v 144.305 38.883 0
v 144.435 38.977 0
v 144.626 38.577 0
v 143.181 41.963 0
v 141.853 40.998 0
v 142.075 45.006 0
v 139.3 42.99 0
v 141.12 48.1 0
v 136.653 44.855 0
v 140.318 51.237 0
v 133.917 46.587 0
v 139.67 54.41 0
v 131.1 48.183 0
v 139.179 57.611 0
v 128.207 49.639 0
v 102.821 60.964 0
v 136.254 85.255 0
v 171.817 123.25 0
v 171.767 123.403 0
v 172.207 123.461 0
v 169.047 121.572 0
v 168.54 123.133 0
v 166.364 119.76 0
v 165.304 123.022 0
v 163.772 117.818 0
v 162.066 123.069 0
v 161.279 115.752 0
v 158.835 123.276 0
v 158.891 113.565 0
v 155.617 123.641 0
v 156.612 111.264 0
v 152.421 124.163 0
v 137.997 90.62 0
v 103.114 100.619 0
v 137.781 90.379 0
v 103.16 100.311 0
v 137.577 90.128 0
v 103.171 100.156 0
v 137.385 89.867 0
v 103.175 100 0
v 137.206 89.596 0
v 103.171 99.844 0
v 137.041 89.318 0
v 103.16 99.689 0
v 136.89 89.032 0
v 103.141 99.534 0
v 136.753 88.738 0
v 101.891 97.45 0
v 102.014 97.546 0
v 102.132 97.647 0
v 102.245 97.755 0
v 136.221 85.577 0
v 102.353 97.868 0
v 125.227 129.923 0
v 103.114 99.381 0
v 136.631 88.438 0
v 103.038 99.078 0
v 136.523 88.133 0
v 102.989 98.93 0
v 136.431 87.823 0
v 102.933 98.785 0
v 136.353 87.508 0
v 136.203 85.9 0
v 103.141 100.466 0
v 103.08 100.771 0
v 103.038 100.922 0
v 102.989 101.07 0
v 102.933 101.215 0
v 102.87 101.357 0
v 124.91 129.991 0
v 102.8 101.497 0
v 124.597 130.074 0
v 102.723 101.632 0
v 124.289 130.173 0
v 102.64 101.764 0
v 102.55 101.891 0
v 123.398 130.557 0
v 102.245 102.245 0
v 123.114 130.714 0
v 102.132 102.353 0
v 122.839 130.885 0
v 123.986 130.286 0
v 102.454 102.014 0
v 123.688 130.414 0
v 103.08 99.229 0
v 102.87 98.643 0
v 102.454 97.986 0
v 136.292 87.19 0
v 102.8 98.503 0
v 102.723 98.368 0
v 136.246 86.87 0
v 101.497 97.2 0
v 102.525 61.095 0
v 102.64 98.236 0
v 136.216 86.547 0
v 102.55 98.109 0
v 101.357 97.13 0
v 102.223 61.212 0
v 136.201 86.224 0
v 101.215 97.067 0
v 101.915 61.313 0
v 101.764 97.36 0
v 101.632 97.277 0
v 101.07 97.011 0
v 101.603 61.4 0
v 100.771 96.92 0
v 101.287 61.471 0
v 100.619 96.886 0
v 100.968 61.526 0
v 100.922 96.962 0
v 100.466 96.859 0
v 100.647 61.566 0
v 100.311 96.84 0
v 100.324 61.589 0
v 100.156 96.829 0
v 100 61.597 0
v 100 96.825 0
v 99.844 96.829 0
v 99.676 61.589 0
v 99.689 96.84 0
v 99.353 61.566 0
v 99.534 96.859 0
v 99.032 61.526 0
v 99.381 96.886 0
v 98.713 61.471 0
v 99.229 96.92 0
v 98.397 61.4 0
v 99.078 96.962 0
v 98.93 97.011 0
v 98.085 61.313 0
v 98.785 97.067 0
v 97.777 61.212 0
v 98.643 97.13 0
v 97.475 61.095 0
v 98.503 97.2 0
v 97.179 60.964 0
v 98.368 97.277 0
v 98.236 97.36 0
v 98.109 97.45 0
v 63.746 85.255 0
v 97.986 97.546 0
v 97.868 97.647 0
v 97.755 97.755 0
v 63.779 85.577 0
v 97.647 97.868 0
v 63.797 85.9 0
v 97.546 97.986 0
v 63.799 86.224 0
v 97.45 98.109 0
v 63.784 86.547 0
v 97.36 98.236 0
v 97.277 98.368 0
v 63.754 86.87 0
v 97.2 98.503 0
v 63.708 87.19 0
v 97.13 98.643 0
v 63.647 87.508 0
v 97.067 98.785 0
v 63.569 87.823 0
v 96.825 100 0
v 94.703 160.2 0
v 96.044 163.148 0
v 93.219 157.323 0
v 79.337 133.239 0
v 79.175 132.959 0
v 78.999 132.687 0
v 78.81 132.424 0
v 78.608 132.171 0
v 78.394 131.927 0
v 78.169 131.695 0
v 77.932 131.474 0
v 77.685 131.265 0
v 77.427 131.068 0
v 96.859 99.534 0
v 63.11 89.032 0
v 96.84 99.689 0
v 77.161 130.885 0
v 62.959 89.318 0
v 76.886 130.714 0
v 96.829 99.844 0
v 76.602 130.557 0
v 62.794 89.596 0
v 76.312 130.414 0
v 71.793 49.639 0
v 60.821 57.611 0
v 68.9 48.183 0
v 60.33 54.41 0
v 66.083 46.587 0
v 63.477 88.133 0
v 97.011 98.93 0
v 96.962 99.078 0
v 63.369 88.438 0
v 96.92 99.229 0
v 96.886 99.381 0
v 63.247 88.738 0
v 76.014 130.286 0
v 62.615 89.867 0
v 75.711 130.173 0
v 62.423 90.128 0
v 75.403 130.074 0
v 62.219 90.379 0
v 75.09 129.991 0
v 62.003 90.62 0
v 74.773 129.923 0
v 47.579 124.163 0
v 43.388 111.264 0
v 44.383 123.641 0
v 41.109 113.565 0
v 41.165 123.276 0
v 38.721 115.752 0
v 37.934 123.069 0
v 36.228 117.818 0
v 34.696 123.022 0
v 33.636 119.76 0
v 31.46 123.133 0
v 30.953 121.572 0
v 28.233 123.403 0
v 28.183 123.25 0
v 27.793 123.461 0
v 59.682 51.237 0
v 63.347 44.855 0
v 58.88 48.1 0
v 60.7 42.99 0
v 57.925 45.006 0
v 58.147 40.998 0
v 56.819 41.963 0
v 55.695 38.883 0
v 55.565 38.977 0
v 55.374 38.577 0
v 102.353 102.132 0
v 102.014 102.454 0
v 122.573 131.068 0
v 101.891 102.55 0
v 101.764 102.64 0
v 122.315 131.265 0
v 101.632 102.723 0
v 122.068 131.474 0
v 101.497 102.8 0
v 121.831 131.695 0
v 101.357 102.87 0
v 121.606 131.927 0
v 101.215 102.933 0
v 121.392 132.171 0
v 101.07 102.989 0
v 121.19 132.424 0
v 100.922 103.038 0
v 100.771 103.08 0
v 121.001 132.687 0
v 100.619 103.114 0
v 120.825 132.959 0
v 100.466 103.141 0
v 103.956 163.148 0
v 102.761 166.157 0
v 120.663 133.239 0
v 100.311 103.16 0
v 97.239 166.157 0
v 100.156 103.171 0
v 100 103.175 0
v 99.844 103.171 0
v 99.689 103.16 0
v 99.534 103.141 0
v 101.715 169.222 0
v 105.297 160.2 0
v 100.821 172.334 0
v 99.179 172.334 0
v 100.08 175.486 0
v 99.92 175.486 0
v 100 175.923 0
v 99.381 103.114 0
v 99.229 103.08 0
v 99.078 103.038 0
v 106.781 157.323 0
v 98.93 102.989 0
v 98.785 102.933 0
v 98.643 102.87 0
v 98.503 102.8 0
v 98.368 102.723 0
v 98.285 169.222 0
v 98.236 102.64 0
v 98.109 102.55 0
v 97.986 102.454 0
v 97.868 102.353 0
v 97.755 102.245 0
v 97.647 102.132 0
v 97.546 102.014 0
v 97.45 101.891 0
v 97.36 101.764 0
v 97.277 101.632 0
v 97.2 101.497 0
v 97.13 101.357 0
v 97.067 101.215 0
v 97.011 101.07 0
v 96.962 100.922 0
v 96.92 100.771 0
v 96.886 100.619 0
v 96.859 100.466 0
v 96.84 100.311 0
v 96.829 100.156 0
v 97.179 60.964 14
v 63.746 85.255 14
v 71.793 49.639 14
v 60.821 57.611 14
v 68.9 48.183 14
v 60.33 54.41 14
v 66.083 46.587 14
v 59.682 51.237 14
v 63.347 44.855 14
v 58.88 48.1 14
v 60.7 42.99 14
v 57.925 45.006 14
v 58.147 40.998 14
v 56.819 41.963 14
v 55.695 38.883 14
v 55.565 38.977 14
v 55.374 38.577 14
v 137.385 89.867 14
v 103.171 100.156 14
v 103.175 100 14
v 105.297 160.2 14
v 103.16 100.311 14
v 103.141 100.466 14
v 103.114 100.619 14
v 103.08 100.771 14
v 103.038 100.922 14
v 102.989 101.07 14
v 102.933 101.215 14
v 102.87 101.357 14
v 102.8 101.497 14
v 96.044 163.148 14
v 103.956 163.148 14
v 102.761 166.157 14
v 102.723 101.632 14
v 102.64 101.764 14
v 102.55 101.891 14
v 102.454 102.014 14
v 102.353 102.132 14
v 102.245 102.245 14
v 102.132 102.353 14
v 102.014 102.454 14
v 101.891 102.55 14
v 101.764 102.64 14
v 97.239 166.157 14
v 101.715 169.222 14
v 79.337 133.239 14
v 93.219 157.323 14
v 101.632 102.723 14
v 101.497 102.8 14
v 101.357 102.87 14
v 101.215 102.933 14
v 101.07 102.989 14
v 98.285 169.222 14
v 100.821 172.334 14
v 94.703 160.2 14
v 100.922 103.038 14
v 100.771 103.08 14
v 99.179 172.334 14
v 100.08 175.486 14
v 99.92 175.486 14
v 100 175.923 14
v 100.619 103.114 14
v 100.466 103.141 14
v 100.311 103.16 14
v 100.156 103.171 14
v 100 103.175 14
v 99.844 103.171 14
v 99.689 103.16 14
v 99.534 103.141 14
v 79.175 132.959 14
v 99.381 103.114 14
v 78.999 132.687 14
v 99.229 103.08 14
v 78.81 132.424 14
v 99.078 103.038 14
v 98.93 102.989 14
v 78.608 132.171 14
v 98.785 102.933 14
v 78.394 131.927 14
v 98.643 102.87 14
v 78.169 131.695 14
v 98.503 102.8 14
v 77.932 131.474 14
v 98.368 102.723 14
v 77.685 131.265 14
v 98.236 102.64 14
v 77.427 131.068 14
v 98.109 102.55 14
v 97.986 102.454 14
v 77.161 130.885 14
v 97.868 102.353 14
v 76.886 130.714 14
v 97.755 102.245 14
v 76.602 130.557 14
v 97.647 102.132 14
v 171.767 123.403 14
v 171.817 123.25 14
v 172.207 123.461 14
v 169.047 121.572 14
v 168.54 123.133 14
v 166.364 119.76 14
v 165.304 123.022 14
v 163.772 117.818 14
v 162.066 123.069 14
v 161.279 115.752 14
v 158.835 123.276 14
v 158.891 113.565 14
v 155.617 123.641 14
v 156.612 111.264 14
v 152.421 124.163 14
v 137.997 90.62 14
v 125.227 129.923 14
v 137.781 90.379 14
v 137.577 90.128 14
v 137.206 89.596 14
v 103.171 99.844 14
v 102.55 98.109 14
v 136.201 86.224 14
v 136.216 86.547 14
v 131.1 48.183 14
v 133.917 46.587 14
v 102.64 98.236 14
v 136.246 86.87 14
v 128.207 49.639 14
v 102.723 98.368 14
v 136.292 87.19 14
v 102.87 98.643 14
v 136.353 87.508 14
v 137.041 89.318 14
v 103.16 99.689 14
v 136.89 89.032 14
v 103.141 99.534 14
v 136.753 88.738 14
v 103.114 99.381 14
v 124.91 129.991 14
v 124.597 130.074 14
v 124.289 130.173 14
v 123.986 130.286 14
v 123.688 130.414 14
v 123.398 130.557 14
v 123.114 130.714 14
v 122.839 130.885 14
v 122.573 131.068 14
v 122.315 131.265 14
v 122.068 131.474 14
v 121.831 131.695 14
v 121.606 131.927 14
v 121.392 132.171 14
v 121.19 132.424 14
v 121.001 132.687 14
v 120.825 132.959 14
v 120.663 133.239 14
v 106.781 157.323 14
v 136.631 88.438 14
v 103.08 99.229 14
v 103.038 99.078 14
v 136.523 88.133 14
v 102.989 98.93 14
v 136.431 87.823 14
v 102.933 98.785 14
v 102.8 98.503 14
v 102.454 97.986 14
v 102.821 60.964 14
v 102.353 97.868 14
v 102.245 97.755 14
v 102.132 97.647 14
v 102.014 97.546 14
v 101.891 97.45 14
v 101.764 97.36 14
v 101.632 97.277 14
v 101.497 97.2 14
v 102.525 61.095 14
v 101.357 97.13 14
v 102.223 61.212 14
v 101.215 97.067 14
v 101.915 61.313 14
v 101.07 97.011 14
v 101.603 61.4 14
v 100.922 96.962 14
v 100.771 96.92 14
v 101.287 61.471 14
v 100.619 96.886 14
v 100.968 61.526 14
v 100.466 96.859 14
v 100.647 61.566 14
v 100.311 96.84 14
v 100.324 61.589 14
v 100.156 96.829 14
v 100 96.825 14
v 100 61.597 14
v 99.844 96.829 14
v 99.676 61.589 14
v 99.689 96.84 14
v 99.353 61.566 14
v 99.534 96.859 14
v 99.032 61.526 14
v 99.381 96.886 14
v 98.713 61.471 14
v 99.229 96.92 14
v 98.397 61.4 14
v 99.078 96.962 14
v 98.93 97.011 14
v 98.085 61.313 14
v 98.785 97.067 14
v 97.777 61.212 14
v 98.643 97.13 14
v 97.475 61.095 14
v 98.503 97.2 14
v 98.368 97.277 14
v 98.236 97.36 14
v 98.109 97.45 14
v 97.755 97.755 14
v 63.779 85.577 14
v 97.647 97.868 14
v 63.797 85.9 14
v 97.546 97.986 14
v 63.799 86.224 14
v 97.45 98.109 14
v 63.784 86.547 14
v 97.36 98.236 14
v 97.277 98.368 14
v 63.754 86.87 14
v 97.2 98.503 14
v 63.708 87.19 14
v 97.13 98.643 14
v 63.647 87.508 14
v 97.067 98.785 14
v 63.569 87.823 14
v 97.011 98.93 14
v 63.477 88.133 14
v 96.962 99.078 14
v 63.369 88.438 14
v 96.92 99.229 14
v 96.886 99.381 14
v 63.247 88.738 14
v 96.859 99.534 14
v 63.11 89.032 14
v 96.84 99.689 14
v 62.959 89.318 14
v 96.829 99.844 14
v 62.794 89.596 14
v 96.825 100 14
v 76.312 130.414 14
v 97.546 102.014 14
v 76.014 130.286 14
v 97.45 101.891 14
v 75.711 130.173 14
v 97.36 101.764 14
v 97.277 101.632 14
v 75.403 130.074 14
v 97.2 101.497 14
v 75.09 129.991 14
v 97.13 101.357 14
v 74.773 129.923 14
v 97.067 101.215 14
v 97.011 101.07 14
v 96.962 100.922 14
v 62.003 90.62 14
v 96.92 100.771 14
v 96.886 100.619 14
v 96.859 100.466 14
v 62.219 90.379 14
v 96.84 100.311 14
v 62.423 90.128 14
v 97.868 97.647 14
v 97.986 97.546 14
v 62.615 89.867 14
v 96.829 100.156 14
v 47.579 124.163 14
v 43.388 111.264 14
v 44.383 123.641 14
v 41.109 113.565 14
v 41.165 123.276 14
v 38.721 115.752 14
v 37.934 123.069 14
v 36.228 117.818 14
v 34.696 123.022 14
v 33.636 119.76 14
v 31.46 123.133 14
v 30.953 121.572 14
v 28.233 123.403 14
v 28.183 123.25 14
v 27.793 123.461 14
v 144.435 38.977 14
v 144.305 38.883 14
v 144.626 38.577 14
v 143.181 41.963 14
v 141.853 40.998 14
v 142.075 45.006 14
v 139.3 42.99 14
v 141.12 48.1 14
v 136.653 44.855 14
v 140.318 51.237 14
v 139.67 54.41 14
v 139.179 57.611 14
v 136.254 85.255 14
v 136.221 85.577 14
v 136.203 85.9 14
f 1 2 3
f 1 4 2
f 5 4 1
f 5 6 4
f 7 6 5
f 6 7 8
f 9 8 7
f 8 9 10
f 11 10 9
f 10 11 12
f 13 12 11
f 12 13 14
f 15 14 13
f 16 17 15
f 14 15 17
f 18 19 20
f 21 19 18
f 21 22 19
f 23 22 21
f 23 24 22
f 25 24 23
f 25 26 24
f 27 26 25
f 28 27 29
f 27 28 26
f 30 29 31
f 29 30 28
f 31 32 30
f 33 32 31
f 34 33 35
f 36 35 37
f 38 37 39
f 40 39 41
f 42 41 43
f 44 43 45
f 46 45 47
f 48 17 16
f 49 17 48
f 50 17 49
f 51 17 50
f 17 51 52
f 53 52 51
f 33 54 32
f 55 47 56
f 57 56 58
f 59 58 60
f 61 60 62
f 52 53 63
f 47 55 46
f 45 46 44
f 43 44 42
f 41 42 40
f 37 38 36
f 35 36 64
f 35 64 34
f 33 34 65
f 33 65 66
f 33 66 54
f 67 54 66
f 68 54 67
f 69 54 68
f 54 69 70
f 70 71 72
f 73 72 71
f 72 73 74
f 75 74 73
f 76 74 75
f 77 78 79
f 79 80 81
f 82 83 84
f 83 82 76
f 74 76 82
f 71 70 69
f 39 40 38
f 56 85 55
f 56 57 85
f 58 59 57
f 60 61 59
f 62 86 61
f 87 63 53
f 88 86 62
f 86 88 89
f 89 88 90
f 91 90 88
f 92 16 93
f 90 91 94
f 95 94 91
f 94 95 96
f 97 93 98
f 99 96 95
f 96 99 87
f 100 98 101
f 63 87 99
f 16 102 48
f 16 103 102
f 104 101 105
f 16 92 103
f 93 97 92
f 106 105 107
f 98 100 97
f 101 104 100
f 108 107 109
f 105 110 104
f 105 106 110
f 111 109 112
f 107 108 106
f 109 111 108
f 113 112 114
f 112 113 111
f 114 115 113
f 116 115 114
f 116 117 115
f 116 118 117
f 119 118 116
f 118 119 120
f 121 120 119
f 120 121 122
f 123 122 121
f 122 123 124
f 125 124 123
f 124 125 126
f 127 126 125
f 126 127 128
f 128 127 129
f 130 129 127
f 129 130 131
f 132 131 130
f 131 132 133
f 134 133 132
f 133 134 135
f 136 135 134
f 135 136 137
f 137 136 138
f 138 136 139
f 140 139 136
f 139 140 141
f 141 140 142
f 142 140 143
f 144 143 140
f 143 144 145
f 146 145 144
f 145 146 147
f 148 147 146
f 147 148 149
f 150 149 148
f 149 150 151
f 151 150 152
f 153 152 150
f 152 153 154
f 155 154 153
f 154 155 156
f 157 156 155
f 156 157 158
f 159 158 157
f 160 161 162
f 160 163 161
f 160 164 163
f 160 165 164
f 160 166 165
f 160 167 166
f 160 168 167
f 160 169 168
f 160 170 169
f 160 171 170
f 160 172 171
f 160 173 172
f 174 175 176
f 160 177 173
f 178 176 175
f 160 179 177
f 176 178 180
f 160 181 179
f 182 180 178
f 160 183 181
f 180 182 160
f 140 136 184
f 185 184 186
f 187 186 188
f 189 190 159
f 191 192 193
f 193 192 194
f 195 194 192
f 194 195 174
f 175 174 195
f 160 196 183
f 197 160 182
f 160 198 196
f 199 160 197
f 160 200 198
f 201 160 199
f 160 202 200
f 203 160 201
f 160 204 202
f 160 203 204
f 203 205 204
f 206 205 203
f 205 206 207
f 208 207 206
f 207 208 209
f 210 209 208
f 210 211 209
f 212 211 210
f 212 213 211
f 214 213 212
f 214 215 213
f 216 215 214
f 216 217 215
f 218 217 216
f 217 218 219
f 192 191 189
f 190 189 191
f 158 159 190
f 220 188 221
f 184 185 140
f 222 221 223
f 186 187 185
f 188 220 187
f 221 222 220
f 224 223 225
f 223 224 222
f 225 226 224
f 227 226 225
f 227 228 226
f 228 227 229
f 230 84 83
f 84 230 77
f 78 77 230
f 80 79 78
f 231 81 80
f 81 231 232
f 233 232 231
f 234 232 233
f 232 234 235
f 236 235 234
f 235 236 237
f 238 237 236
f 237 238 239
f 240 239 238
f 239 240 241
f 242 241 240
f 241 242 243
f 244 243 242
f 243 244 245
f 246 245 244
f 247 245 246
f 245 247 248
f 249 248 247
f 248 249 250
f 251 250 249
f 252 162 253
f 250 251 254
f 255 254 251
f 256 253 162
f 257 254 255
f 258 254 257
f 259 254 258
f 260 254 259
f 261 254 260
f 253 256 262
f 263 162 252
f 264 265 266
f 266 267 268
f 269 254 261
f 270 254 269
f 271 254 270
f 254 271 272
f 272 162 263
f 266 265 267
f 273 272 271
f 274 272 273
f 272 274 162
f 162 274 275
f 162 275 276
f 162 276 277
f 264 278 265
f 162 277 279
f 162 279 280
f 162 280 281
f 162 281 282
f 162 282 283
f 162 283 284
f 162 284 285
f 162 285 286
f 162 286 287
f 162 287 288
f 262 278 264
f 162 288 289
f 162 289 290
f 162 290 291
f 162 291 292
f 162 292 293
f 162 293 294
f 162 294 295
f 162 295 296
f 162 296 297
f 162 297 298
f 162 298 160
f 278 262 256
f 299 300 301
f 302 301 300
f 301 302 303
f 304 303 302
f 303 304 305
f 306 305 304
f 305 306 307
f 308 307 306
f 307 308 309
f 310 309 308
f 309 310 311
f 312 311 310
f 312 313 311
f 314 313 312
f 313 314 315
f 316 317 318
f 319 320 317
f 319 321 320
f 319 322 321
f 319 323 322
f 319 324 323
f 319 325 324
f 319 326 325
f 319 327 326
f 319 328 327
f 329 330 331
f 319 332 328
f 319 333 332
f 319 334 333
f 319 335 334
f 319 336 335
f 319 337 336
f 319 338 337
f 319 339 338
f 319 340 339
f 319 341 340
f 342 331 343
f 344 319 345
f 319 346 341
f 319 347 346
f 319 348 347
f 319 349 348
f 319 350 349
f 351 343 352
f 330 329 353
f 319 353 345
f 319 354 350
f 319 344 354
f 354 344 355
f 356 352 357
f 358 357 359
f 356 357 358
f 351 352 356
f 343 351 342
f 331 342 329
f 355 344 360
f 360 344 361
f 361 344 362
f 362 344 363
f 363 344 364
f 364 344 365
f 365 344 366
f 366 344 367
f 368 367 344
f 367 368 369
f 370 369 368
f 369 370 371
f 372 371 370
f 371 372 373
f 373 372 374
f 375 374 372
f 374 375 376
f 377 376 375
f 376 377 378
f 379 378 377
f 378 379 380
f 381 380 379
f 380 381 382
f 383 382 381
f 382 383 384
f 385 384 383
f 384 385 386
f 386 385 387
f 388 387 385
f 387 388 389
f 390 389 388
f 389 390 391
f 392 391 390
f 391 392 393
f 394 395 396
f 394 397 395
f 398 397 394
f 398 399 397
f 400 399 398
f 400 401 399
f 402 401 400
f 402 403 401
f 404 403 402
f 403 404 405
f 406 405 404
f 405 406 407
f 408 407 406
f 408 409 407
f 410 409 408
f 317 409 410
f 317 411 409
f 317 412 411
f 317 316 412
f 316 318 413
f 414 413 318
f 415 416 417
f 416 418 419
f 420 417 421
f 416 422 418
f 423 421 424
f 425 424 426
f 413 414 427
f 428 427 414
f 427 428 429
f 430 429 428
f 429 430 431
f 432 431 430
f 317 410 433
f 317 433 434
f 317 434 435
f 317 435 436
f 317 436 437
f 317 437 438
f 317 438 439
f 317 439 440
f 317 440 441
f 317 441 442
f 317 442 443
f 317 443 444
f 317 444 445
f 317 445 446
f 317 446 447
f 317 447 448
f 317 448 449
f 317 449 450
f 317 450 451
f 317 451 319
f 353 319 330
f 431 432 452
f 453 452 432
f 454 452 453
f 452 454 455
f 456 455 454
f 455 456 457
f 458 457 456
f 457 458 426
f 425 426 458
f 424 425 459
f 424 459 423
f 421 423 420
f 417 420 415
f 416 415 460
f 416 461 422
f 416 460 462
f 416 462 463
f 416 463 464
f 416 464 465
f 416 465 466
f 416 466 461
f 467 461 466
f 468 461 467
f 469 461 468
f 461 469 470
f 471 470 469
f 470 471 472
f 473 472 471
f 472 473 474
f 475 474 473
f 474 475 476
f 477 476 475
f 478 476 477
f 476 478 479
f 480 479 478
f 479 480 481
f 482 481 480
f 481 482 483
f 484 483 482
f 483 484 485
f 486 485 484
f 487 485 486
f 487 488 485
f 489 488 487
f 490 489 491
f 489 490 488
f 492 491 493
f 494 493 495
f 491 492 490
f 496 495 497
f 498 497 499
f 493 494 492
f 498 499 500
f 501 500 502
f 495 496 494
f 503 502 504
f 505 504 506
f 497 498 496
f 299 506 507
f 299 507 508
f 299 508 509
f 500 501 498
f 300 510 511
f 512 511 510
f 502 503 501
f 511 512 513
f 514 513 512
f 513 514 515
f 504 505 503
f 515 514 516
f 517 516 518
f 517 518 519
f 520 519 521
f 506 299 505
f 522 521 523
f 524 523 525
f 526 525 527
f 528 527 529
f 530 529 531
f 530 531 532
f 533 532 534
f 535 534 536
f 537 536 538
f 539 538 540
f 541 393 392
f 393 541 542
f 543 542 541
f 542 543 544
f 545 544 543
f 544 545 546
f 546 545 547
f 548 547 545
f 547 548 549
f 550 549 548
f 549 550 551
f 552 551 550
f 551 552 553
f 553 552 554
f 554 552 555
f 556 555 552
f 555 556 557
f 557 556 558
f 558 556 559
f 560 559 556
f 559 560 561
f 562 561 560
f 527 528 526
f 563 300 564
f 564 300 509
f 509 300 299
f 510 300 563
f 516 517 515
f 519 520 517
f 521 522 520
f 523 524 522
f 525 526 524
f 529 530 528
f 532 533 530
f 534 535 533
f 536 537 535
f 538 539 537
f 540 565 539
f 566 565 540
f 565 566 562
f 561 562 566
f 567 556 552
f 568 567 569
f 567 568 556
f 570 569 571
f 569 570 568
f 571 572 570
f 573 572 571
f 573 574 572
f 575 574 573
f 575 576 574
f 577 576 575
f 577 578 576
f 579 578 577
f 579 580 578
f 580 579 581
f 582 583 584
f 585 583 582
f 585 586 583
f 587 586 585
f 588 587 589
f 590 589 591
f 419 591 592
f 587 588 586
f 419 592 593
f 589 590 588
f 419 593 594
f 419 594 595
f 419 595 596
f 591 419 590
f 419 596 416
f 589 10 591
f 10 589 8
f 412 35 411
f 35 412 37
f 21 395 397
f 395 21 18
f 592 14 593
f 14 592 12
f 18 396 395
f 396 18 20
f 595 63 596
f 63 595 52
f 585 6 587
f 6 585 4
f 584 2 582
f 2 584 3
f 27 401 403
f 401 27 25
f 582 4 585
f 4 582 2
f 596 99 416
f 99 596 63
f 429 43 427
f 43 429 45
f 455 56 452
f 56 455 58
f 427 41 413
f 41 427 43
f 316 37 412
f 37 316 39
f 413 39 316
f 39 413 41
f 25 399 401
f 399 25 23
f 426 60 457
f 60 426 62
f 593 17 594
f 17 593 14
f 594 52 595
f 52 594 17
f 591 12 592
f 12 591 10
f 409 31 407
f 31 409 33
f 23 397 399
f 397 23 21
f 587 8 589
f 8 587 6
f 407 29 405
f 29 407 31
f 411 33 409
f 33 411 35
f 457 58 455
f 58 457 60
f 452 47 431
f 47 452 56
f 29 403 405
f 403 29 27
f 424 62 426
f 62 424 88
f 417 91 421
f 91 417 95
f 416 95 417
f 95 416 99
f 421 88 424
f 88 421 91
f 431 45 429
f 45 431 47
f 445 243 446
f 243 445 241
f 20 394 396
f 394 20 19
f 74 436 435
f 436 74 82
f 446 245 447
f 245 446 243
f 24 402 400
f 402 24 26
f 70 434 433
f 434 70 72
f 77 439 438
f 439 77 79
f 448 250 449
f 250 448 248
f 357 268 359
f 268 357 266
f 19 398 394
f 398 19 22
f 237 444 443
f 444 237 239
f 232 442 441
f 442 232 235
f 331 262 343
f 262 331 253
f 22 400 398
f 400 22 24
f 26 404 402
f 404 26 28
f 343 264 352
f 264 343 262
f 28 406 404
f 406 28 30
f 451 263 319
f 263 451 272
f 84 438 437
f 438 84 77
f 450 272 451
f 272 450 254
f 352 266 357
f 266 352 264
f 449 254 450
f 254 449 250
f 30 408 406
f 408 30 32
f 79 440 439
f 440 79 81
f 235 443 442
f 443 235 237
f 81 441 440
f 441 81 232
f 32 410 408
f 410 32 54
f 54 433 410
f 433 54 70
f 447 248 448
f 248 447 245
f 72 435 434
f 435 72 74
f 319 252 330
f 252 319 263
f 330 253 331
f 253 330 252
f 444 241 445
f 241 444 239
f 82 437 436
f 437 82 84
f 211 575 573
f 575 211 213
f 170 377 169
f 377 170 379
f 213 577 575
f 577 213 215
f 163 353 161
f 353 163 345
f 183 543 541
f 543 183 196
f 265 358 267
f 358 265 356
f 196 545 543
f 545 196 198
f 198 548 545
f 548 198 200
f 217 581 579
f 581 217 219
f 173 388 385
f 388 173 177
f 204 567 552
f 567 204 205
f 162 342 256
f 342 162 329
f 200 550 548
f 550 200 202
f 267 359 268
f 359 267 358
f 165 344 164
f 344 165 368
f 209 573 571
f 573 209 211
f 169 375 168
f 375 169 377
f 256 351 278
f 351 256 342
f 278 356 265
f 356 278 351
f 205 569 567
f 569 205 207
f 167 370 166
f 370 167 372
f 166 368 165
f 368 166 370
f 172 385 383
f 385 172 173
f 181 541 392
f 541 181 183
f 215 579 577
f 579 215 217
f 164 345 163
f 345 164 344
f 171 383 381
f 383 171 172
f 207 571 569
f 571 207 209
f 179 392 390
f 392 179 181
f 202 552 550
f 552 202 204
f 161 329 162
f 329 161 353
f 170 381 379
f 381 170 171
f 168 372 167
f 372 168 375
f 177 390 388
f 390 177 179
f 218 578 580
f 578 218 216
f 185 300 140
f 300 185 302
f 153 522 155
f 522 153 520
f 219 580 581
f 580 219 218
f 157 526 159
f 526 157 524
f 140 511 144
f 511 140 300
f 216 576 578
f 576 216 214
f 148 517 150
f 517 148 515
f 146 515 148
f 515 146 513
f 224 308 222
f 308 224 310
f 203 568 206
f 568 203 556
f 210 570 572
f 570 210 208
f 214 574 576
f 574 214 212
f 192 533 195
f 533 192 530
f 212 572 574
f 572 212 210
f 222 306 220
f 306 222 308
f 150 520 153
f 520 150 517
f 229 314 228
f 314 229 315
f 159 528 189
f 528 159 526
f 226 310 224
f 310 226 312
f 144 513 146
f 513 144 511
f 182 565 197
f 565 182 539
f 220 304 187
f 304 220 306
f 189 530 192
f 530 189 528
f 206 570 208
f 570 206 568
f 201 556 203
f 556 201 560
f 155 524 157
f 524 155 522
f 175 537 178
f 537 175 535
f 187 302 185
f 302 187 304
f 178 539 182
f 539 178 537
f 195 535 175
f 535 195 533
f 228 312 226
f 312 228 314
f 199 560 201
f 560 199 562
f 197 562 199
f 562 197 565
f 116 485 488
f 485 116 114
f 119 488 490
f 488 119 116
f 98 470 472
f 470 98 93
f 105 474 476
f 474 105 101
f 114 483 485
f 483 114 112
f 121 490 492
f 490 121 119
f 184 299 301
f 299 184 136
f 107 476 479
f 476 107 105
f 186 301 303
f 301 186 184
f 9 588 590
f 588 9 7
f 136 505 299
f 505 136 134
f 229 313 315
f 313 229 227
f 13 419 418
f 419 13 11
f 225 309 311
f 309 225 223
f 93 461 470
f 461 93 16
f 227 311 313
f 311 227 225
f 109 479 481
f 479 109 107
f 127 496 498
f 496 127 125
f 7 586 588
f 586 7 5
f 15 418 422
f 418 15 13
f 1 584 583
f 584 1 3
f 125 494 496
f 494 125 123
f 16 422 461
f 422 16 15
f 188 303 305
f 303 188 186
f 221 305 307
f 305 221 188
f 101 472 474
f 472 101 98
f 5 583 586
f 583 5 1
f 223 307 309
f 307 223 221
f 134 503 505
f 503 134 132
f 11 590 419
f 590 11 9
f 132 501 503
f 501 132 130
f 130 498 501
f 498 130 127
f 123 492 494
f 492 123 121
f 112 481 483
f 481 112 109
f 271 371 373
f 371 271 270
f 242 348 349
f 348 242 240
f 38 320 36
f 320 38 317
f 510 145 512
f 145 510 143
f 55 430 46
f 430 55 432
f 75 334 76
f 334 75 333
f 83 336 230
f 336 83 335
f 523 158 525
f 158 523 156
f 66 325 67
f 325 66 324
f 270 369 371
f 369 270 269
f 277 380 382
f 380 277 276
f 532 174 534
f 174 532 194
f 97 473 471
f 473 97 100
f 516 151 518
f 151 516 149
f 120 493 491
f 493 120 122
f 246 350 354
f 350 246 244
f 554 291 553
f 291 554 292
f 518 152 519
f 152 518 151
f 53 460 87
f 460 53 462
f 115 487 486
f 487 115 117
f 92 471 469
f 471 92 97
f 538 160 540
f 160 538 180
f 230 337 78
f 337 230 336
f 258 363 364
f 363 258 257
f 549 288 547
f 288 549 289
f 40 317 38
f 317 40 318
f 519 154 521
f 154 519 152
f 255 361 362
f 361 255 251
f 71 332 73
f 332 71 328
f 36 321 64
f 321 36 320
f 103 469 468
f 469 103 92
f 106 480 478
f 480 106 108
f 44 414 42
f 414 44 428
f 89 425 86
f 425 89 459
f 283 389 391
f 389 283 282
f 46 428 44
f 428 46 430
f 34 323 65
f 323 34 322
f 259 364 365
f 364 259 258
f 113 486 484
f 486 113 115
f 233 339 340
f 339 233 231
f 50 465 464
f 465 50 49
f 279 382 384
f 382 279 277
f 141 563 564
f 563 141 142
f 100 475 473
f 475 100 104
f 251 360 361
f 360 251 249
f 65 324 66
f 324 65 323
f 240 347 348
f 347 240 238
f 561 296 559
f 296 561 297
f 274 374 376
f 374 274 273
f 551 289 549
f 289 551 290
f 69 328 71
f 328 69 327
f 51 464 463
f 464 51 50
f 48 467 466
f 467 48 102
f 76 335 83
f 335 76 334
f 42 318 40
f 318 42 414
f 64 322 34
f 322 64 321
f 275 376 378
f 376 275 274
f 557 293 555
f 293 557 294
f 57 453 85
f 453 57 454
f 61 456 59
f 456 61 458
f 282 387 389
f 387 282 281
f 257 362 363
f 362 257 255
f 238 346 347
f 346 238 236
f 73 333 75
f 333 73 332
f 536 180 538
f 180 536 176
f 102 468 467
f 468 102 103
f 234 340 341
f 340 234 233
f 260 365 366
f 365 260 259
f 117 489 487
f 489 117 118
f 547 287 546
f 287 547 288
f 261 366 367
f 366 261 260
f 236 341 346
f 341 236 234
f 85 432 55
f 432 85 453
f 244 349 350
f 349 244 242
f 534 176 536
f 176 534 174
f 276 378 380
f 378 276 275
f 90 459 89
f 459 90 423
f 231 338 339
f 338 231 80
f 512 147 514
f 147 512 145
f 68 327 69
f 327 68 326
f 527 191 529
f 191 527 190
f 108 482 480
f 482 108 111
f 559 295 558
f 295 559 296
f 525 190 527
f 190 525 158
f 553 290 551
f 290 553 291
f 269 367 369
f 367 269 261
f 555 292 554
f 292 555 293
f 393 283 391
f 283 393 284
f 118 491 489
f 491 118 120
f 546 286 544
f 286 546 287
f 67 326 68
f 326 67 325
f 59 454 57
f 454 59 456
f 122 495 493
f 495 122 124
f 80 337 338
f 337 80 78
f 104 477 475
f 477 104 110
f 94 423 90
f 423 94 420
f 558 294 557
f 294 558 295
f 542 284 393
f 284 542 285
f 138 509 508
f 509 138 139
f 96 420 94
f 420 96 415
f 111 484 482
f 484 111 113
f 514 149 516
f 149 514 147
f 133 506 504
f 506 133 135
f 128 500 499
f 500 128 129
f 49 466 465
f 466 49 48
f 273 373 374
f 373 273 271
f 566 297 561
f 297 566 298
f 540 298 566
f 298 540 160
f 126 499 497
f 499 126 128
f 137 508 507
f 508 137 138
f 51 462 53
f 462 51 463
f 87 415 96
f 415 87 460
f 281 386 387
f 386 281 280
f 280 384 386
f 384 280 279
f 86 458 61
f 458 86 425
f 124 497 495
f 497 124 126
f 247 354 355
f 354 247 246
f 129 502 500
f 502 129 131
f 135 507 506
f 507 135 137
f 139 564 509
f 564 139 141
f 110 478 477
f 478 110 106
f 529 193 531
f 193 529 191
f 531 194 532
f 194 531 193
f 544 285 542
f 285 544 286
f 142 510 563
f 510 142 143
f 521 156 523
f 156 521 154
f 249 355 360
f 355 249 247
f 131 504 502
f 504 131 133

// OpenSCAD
$inch = 25.4;
$half = $inch/2;
$quarter = $inch/4;
$eigth = $inch/8;
$sixteenth = $inch/16;
$thirtysecondth = $inch/32;

$fn=128;

$in_radius = 35;
$out_radius = 100;

$tooth_count = 5;

$inner_tooth_r = 0.3 * (($in_radius * 3.14159)/$tooth_count);
$outer_tooth_r = 1.05 * (($out_radius * 3.14159)/$tooth_count);

module gear_plate() {
   difference() {
	   union() {
			cylinder(r=$out_radius, h=14);   
		   cylinder(r=$in_radius, h=14);
	   }
      translate([0,0,-1]) {
		    cylinder(r=3.175, h=18);
      }

      for (i = [1 : $tooth_count]) {
         rotate([0,0,i * 360/$tooth_count]) {
	         translate([0,-$out_radius*1.1, -1]) {
                hull() {
                	cylinder(r= $outer_tooth_r, h=18);
               	 	translate([0, ($out_radius-$in_radius), 0]) {
	                    cylinder(r= $inner_tooth_r, h=18);
	                }
                }
	         }
         }
      }
   }
}

$2d = 0;
if ($2d) {
    projection(cut=true) {
       translate([$out_radius,$out_radius,0]) rotate([0,0,0]) {
          gear_plate($plate_long, $plate_wide);
       }
    }
} else {
   translate([$out_radius, $out_radius,0]) rotate([0,0,0]) {
      gear_plate($plate_long, $plate_wide);
   }
}
